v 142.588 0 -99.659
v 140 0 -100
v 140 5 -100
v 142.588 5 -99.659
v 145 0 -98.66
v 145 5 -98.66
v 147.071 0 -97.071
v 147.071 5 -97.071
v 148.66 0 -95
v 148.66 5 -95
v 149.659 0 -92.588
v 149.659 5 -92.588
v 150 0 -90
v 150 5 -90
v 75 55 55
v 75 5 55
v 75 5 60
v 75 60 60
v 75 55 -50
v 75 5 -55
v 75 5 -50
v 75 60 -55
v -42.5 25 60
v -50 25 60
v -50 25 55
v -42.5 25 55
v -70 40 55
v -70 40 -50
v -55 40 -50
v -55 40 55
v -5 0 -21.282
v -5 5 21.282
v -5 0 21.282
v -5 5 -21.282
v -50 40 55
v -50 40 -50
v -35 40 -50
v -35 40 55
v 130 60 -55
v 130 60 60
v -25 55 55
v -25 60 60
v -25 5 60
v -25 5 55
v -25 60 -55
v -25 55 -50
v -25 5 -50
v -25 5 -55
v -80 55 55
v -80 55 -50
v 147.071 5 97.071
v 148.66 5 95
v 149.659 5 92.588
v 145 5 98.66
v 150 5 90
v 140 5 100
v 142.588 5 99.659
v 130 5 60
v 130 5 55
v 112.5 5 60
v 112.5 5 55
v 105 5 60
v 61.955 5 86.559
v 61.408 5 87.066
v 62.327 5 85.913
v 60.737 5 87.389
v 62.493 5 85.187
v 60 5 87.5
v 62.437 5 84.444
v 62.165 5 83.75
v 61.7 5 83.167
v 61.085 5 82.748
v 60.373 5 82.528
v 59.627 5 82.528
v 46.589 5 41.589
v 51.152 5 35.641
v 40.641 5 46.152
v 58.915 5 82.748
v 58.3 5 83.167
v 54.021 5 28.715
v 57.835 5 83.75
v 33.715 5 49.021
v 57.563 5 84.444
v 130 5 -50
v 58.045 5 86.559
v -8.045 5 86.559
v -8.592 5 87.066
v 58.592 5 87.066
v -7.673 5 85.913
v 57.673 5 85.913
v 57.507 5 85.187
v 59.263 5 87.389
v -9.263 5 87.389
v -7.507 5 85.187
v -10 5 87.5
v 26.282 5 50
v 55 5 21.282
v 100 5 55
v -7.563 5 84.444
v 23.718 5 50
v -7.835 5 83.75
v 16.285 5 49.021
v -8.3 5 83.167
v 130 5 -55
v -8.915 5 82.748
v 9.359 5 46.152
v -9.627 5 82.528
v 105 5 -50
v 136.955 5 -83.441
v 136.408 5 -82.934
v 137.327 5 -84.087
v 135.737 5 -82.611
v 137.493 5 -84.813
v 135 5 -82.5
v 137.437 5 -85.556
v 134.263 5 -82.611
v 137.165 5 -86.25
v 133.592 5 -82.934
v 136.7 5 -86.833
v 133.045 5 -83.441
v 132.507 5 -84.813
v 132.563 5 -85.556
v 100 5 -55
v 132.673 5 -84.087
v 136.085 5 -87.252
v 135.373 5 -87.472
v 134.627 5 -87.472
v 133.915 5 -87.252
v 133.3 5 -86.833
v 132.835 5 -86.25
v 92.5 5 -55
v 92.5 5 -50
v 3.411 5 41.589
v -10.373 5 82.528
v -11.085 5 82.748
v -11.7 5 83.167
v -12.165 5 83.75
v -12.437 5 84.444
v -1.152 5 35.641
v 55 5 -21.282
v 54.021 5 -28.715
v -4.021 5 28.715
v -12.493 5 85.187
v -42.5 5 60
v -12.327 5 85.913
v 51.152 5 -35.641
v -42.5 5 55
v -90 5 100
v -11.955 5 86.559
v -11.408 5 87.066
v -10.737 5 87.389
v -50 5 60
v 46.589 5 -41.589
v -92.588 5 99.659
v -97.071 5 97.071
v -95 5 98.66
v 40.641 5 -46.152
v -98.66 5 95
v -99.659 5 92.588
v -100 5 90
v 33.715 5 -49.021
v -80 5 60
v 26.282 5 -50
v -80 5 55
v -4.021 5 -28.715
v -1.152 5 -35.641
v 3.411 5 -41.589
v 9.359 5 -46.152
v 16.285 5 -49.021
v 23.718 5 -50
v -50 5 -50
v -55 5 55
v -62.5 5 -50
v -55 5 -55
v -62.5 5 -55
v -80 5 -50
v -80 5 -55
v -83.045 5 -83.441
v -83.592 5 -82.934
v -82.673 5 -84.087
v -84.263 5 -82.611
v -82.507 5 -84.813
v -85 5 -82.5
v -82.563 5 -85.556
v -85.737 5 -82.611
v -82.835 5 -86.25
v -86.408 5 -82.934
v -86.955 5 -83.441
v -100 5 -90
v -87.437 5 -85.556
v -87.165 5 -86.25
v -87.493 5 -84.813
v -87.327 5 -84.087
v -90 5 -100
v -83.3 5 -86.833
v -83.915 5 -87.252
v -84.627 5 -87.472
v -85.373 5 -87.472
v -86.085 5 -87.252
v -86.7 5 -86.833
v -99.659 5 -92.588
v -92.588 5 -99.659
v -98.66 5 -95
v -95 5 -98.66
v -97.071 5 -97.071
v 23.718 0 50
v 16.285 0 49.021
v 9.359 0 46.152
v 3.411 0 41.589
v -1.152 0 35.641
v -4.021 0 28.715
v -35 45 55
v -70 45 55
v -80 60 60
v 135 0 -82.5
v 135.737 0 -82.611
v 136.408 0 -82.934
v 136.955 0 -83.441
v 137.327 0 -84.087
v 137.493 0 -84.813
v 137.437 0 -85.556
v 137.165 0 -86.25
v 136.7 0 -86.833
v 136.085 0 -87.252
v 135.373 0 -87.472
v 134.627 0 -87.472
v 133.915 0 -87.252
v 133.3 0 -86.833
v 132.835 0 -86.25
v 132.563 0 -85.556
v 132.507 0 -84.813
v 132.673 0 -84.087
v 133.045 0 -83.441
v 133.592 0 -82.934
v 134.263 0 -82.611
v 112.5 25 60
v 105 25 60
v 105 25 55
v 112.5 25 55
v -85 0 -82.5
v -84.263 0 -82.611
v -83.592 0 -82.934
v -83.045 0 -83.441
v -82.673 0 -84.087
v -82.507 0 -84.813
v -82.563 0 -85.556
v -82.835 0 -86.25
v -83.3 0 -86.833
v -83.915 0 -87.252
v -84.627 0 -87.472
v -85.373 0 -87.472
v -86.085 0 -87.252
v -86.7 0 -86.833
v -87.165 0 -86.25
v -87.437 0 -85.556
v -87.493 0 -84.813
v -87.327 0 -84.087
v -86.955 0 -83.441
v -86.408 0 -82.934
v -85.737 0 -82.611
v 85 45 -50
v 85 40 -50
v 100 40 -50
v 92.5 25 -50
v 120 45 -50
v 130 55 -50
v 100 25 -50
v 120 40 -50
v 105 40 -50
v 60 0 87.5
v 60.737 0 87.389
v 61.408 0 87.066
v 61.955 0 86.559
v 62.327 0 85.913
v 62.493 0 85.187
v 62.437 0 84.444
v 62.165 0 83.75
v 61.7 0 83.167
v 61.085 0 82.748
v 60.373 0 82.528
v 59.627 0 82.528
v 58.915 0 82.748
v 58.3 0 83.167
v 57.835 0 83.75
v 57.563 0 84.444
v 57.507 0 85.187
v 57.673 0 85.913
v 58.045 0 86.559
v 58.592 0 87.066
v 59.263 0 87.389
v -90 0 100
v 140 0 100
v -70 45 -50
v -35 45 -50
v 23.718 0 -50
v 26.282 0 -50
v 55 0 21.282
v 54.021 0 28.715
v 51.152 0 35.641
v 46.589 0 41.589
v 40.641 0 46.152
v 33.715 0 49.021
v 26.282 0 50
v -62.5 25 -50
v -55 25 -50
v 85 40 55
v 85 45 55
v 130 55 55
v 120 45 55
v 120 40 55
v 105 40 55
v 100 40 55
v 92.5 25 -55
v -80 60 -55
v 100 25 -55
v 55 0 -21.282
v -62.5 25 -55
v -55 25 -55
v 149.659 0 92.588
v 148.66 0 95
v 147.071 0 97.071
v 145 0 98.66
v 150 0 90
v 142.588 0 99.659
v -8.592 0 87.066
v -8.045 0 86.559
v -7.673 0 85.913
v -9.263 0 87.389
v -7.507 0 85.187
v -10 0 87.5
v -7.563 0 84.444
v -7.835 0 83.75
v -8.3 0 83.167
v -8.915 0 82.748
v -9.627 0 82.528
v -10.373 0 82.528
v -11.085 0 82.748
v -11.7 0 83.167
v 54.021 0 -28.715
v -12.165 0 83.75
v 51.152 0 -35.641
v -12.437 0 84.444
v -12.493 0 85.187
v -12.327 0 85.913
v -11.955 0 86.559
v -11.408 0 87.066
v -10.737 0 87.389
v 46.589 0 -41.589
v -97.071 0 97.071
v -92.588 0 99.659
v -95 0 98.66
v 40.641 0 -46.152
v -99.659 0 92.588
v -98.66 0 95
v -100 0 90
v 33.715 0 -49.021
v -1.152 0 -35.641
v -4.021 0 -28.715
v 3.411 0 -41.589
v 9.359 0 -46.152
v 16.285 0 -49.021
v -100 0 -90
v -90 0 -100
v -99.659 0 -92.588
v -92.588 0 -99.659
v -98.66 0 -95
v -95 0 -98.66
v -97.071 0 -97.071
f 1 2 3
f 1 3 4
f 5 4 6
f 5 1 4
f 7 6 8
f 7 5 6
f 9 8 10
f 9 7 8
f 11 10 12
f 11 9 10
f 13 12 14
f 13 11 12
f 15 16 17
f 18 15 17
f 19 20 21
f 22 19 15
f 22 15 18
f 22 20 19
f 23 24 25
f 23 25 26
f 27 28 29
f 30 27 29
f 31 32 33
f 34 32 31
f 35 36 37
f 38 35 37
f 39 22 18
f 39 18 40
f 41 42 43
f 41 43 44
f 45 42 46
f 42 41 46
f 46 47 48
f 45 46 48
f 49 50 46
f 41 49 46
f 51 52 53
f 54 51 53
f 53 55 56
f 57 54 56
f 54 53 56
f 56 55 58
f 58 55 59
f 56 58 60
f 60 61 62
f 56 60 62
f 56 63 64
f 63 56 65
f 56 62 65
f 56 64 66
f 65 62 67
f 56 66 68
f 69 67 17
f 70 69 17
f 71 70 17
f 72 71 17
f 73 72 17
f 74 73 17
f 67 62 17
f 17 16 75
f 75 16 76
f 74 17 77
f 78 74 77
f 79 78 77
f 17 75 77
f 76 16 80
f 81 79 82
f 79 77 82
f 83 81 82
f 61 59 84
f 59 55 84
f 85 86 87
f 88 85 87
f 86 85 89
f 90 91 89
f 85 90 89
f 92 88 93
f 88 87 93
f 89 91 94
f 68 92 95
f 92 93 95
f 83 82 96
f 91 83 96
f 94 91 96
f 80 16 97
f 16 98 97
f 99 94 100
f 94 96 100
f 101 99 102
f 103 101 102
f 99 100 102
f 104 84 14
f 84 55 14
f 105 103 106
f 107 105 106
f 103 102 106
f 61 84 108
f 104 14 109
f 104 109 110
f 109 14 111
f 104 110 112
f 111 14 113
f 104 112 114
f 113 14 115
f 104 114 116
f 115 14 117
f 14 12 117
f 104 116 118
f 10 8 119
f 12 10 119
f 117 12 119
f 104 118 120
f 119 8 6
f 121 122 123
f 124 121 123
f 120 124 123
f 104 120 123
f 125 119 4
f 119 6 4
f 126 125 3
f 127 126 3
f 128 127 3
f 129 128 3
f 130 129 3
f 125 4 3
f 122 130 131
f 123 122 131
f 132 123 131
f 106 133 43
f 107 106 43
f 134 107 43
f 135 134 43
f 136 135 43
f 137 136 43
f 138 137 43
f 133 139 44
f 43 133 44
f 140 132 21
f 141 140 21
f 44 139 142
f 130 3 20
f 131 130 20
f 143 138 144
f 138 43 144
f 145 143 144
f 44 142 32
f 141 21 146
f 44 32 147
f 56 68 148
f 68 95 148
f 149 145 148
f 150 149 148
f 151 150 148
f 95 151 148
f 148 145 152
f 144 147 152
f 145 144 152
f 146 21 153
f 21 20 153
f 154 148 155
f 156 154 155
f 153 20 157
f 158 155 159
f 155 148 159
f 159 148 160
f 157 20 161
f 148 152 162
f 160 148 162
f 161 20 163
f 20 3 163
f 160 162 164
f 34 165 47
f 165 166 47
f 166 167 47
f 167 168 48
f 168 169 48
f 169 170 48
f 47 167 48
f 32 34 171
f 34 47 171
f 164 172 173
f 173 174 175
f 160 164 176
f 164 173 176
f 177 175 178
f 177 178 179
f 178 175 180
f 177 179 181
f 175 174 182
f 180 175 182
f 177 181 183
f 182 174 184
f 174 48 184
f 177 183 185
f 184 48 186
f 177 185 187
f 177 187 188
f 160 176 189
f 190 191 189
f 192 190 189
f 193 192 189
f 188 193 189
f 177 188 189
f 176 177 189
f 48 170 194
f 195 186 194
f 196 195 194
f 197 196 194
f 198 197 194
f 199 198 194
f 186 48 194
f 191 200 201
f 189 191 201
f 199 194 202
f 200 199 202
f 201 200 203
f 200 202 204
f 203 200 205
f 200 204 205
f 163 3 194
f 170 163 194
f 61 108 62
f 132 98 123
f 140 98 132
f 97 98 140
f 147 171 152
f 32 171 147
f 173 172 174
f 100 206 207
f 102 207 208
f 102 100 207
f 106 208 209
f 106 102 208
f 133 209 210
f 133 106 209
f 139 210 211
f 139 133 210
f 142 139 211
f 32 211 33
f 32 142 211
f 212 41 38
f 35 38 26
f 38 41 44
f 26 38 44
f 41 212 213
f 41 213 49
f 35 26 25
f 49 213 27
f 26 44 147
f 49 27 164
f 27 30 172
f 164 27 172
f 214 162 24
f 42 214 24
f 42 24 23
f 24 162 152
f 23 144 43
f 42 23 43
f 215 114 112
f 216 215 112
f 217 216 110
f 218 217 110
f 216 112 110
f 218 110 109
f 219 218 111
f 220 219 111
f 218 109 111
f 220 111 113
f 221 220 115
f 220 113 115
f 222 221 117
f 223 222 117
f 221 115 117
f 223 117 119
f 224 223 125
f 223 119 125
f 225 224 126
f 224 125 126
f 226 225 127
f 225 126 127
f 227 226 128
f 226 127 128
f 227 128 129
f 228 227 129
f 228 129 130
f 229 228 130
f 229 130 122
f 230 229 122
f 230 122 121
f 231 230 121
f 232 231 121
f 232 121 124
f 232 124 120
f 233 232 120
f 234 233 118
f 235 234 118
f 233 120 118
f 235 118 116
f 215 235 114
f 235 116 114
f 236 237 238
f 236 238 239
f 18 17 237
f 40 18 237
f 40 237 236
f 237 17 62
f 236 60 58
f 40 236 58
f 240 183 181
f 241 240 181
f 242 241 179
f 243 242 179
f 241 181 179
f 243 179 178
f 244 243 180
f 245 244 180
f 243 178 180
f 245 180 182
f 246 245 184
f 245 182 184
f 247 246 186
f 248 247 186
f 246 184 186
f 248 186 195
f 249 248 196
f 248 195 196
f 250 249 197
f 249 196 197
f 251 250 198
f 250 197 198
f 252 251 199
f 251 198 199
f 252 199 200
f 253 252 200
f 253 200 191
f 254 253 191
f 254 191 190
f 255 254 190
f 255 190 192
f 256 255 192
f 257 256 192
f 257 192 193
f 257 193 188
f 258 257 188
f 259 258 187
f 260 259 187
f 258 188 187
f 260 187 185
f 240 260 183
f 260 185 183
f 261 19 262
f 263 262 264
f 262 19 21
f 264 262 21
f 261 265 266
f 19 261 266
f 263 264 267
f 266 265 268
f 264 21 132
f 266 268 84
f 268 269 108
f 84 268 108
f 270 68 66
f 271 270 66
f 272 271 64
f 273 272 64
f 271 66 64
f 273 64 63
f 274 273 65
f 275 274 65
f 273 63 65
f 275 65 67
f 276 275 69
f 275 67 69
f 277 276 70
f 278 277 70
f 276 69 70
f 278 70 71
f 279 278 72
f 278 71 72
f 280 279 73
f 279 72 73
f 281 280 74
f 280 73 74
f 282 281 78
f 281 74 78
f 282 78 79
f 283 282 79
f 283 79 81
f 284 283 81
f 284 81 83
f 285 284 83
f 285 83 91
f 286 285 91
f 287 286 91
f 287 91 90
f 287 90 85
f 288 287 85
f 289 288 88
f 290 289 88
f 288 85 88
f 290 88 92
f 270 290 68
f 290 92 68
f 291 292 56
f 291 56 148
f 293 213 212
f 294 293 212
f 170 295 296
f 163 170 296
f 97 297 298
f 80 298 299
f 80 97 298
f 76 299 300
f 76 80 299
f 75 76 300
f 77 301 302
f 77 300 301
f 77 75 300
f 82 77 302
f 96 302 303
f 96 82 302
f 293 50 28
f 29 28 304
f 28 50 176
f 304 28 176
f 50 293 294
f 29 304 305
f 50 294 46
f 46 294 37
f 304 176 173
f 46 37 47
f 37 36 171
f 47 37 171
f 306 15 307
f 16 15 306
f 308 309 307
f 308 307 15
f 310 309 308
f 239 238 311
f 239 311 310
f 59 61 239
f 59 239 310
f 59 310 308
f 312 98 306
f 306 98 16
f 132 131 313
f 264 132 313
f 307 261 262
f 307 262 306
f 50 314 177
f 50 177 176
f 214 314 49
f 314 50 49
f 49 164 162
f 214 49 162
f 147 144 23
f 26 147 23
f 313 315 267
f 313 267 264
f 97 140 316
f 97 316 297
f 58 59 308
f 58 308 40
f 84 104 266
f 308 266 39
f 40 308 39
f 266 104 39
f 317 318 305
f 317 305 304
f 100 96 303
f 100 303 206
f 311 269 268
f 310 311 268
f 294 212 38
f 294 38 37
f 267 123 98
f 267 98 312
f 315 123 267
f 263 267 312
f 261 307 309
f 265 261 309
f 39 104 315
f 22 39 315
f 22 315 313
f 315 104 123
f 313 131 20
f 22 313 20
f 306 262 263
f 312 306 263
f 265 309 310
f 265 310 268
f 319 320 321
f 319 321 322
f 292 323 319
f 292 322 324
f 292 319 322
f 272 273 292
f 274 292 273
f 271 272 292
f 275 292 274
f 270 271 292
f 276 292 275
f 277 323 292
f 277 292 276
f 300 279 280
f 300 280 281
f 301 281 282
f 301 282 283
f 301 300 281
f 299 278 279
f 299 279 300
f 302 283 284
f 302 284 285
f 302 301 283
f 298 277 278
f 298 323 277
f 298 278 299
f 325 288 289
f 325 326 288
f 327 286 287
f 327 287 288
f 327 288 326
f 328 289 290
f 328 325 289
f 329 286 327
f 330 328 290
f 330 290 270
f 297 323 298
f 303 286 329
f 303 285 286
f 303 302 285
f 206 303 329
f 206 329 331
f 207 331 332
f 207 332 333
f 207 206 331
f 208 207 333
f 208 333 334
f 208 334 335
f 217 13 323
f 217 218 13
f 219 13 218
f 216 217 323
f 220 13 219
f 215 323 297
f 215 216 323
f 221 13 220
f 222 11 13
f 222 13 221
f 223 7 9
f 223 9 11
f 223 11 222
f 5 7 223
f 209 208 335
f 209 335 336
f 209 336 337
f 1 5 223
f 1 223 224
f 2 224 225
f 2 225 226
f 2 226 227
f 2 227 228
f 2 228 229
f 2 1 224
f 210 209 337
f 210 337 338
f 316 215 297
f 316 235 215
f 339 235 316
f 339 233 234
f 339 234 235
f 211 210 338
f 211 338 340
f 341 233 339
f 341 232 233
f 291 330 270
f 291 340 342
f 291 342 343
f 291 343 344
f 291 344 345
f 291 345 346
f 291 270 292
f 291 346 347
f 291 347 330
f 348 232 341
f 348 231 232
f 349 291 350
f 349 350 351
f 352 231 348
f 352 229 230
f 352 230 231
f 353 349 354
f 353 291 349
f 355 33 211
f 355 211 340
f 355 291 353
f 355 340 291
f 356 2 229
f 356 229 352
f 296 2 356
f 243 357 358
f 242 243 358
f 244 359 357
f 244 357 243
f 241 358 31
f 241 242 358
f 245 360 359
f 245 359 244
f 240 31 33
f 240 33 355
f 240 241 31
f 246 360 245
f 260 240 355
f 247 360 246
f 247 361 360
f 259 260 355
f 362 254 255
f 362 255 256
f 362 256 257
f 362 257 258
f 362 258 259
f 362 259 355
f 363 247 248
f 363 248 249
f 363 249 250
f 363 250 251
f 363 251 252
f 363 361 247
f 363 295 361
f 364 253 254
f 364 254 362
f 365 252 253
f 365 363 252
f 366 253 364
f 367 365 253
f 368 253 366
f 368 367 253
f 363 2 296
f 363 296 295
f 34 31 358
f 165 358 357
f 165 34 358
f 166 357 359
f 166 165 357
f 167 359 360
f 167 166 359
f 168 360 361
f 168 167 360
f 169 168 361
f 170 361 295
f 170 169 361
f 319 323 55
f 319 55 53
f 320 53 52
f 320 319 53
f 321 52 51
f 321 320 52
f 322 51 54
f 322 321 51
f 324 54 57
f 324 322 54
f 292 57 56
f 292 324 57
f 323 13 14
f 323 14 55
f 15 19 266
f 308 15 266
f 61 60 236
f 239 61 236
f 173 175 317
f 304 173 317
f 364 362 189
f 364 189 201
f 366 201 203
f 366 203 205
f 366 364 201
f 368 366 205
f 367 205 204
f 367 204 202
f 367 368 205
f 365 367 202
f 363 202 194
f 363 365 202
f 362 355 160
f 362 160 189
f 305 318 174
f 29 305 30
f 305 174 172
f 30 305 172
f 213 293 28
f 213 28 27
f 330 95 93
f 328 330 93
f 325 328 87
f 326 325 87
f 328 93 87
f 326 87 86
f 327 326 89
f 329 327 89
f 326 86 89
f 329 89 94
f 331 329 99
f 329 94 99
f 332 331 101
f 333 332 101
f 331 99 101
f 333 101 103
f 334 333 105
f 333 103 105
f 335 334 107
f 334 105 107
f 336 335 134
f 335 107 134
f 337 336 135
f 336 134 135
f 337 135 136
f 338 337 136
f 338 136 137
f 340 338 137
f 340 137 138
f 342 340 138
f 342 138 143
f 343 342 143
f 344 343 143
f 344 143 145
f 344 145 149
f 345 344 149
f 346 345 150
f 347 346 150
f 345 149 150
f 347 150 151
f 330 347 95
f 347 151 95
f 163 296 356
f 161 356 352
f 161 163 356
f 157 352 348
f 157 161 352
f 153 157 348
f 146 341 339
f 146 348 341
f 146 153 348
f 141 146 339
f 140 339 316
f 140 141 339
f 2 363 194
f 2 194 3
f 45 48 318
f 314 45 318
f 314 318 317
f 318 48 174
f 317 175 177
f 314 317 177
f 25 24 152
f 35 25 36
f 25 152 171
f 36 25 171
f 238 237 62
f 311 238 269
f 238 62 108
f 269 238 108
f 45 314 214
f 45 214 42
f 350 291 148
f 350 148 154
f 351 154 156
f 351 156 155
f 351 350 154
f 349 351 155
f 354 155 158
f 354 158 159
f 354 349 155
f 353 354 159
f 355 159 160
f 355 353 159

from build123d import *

# Parameters (mm, degrees)
RESSALTO_EXTRUS_O1_DEPTH = 5
ESBO_O2_R                = 2.5
CORTE_EXTRUS_O1_DEPTH    = 5
RESSALTO_EXTRUS_O3_DEPTH = 35
CORTE_EXTRUS_O2_DEPTH    = 10
ESBO_O7_W                = 55
ESBO_O7_H                = 5
RESSALTO_EXTRUS_O4_DEPTH = 20
ESBO_O8_W                = 55
ESBO_O8_H                = 5
ESBO_O8_H_2              = 5.000335185
RESSALTO_EXTRUS_O6_DEPTH = 105
ESBO_O9_W                = 7.5
ESBO_O9_H                = 20
CORTE_EXTRUS_O4_DEPTH    = 5
ESBO_O10_W               = 7.5
ESBO_O10_H               = 20
CORTE_EXTRUS_O5_DEPTH    = 5
ESBO_O11_W               = 105
ESBO_O11_H               = 5.000335185
CORTE_EXTRUS_O6_DEPTH    = 10
ESBO_O12_W               = 105
ESBO_O12_H               = 5.000335185
CORTE_EXTRUS_O7_DEPTH    = 10
ESBO_O13_W               = 105
ESBO_O13_H               = 5.000335185
CORTE_EXTRUS_O8_DEPTH    = 10
ESBO_O14_W               = 105
ESBO_O14_H               = 5.000335185
CORTE_EXTRUS_O9_DEPTH    = 10


with BuildPart() as part:
    # Esboço1 → Ressalto-extrusão1 (new body)
    with BuildSketch(Plane(origin=(0, 0, 0), x_dir=(1, 0, 0), z_dir=(0, 1, 0))):
        with BuildLine():
            Line((140, -100), (-90, -100))
            ThreePointArc((-90, -100), (-97.071067812, -97.071067812), (-100, -90))
            Line((-100, -90), (-100, 90))
            ThreePointArc((-100, 90), (-97.071067812, 97.071067812), (-90, 100))
            Line((-90, 100), (140, 100))
            ThreePointArc((140, 100), (147.071067812, 97.071067812), (150, 90))
            Line((150, 90), (150, -90))
            ThreePointArc((150, -90), (147.071067812, -97.071067812), (140, -100))
        make_face()
    extrude(amount=RESSALTO_EXTRUS_O1_DEPTH)

    # Esboço2 → Corte-extrusão1 (cut)
    with BuildSketch(Plane(origin=(0, 5, 0), x_dir=(1, 0, 0), z_dir=(0, 1, 0))):
        with Locations(Location((-85, 85, 0), (0, 0, 270))):
            Circle(ESBO_O2_R)
        with Locations(Location((-10, -85, 0), (0, 0, 270))):
            Circle(ESBO_O2_R)
        with Locations(Location((60, -85, 0), (0, 0, 270))):
            Circle(ESBO_O2_R)
        with Locations(Location((135, 85, 0), (0, 0, 270))):
            Circle(ESBO_O2_R)
    extrude(amount=-CORTE_EXTRUS_O1_DEPTH, mode=Mode.SUBTRACT)

    # Esboço5 → Ressalto-extrusão3 (add)
    with BuildSketch(Plane(origin=(0, 5, 0), x_dir=(1, 0, 0), z_dir=(0, 1, 0))):
        Polygon((125, -55), (105, -55), (105, 50), (125, 50), (130, 50), (130, 55), (75, 55), (75, 50), (80, 50), (100, 50), (100, -55), (80, -55), (75, -55), (75, -60), (130, -60), (130, -55), align=None)
        Polygon((-50, -55), (-50, 50), (-30, 50), (-25, 50), (-25, 55), (-80, 55), (-80, 50), (-75, 50), (-55, 50), (-55, -55), (-75, -55), (-80, -55), (-80, -60), (-25, -60), (-25, -55), (-30, -55), align=None)
    extrude(amount=RESSALTO_EXTRUS_O3_DEPTH)

    # Esboço6 → Corte-extrusão2 (cut)
    with BuildSketch(Plane(origin=(0, 5, 0), x_dir=(1, 0, 0), z_dir=(0, 1, 0))):
        with BuildLine():
            Line((23.718326371, 50), (26.281673629, 50))
            ThreePointArc((26.281673629, 50), (46.58859695, 41.58859695), (55, 21.281673629))
            Line((55, 21.281673629), (55, -21.281673629))
            ThreePointArc((55, -21.281673629), (46.58859695, -41.58859695), (26.281673629, -50))
            Line((26.281673629, -50), (23.718326371, -50))
            ThreePointArc((23.718326371, -50), (3.41140305, -41.58859695), (-5, -21.281673629))
            Line((-5, -21.281673629), (-5, 21.281673629))
            ThreePointArc((-5, 21.281673629), (3.41140305, 41.58859695), (23.718326371, 50))
        make_face()
    extrude(amount=-CORTE_EXTRUS_O2_DEPTH, mode=Mode.SUBTRACT)

    # Esboço7 → Ressalto-extrusão4 (add)
    with BuildSketch(Plane(origin=(0, 40, 0), x_dir=(1, 0, 0), z_dir=(0, 1, 0))):
        with Locations((102.5, -57.5)):
            Rectangle(ESBO_O7_W, ESBO_O7_H)
        with Locations((102.5, 52.5)):
            Rectangle(ESBO_O7_W, ESBO_O7_H)
        with Locations((-52.5, 52.5)):
            Rectangle(ESBO_O7_W, ESBO_O7_H)
        with Locations((-52.5, -57.5)):
            Rectangle(ESBO_O7_W, ESBO_O7_H)
    extrude(amount=RESSALTO_EXTRUS_O4_DEPTH)

    # Esboço8 → Ressalto-extrusão6 (add)
    with BuildSketch(Plane.XY.offset(-50)):
        with Locations((102.5, 57.5)):
            Rectangle(ESBO_O8_W, ESBO_O8_H)
        with Locations((-52.5, 57.5)):
            Rectangle(ESBO_O8_W, ESBO_O8_H)
        with Locations((102.5, 42.500167593)):
            Rectangle(ESBO_O8_W, ESBO_O8_H_2)
        with Locations((-52.5, 42.500167593)):
            Rectangle(ESBO_O8_W, ESBO_O8_H_2)
    extrude(amount=RESSALTO_EXTRUS_O6_DEPTH)

    # Esboço9 → Corte-extrusão4 (cut)
    with BuildSketch(Plane(origin=(0, 0, -55), x_dir=(-1, 0, 0), z_dir=(0, 0, -1))):
        with Locations((-96.25, 15)):
            Rectangle(ESBO_O9_W, ESBO_O9_H)
        with Locations((58.75, 15)):
            Rectangle(ESBO_O9_W, ESBO_O9_H)
    extrude(amount=-CORTE_EXTRUS_O4_DEPTH, mode=Mode.SUBTRACT)

    # Esboço10 → Corte-extrusão5 (cut)
    with BuildSketch(Plane.XY.offset(60)):
        with Locations((-46.25, 15)):
            Rectangle(ESBO_O10_W, ESBO_O10_H)
        with Locations((108.75, 15)):
            Rectangle(ESBO_O10_W, ESBO_O10_H)
    extrude(amount=-CORTE_EXTRUS_O5_DEPTH, mode=Mode.SUBTRACT)

    # Esboço11 → Corte-extrusão6 (cut)
    with BuildSketch(Plane(origin=(130, 0, 0), x_dir=(0, 0, -1), z_dir=(1, 0, 0))):
        with Locations((-2.5, 42.500167593)):
            Rectangle(ESBO_O11_W, ESBO_O11_H)
    extrude(amount=-CORTE_EXTRUS_O6_DEPTH, mode=Mode.SUBTRACT)

    # Esboço12 → Corte-extrusão7 (cut)
    with BuildSketch(Plane.ZY.offset(-75)):
        with Locations((2.5, 42.500167593)):
            Rectangle(ESBO_O12_W, ESBO_O12_H)
    extrude(amount=-CORTE_EXTRUS_O7_DEPTH, mode=Mode.SUBTRACT)

    # Esboço13 → Corte-extrusão8 (cut)
    with BuildSketch(Plane(origin=(-25, 0, 0), x_dir=(0, 0, -1), z_dir=(1, 0, 0))):
        with Locations((-2.5, 42.500167593)):
            Rectangle(ESBO_O13_W, ESBO_O13_H)
    extrude(amount=-CORTE_EXTRUS_O8_DEPTH, mode=Mode.SUBTRACT)

    # Esboço14 → Corte-extrusão9 (cut)
    with BuildSketch(Plane.ZY.offset(80)):
        with Locations((2.5, 42.500167593)):
            Rectangle(ESBO_O14_W, ESBO_O14_H)
    extrude(amount=-CORTE_EXTRUS_O9_DEPTH, mode=Mode.SUBTRACT)


solid = part.part
